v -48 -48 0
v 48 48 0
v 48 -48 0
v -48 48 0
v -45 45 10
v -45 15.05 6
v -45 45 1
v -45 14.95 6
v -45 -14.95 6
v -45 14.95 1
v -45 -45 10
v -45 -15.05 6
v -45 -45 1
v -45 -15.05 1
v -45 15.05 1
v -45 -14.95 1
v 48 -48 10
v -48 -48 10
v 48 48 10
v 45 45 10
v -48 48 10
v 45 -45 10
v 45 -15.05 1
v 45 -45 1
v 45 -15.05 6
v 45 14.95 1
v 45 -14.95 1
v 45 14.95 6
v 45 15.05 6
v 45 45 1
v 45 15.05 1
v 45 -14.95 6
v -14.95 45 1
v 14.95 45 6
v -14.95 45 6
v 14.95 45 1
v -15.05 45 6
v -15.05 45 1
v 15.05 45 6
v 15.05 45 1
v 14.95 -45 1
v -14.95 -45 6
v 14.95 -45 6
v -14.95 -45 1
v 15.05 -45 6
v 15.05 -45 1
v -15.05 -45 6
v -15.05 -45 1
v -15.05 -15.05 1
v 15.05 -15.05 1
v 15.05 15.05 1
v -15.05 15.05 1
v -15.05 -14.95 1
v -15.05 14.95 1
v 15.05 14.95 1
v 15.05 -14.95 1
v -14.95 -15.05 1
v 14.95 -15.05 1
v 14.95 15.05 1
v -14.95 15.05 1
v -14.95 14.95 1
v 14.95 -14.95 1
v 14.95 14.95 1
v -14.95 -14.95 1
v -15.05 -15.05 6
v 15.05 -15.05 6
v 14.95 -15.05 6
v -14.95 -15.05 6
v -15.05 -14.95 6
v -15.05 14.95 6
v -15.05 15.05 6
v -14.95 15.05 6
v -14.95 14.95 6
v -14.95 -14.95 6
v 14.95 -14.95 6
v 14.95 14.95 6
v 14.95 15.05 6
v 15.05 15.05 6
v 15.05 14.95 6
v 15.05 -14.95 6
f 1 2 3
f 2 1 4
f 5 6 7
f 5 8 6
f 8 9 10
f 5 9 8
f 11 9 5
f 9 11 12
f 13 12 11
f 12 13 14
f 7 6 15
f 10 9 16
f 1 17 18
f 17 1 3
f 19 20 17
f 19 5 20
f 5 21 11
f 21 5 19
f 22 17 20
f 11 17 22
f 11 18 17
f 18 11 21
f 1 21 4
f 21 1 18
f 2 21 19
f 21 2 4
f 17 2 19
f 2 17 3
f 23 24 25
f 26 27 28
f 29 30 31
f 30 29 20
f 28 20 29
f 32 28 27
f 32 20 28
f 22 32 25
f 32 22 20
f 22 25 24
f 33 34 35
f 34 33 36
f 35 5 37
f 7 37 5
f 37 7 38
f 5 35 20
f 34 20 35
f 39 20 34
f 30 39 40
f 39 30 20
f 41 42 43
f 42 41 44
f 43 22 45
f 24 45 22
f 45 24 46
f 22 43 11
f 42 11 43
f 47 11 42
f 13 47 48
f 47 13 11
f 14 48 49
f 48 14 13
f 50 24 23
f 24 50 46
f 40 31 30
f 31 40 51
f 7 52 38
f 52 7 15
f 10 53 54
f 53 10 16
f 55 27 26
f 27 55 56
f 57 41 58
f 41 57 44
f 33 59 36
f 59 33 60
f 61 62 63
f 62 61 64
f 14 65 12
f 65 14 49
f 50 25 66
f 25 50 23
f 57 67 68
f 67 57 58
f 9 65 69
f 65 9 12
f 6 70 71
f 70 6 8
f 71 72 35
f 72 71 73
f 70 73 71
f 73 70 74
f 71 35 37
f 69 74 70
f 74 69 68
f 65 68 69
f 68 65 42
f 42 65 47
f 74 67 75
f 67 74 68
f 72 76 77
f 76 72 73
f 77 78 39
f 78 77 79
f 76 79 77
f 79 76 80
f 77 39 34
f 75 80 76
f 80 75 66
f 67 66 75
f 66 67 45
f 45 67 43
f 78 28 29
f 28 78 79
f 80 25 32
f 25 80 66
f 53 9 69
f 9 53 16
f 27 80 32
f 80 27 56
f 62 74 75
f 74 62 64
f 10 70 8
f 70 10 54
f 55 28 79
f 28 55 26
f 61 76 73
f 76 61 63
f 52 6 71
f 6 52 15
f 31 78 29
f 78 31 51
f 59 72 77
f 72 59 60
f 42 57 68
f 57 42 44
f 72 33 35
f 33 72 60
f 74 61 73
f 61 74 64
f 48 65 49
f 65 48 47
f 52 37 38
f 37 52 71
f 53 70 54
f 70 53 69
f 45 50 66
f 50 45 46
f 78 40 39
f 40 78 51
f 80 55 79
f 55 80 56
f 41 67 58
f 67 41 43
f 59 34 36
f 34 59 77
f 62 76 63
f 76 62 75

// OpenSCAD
union()
{
    translate([0.0, 0.0, 0.5])
    {
        linear_extrude(height = 1.0, twist = 0.0, scale = 1.0, slices = 1, center = true)
        {
            scale([90.0, 90.0])
            {
                M8();
            }
        }
    }
    union()
    {
        translate([-46.5, 0.0, 5.0])
        {
            linear_extrude(height = 10.0, twist = 0.0, scale = 1.0, slices = 1, center = true)
            {
                scale([3.0, 96.0])
                {
                    M8();
                }
            }
        }
        translate([46.5, 0.0, 5.0])
        {
            linear_extrude(height = 10.0, twist = 0.0, scale = 1.0, slices = 1, center = true)
            {
                scale([3.0, 96.0])
                {
                    M8();
                }
            }
        }
        translate([0.0, 46.5, 5.0])
        {
            linear_extrude(height = 10.0, twist = 0.0, scale = 1.0, slices = 1, center = true)
            {
                scale([90.0, 3.0])
                {
                    M8();
                }
            }
        }
        translate([0.0, -46.5, 5.0])
        {
            linear_extrude(height = 10.0, twist = 0.0, scale = 1.0, slices = 1, center = true)
            {
                scale([90.0, 3.0])
                {
                    M8();
                }
            }
        }
    }
    union()
    {
        translate([0.0, -15.0, 3.5])
        {
            linear_extrude(height = 5.0, twist = 0.0, scale = 1.0, slices = 1, center = true)
            {
                scale([90.0, 0.1])
                {
                    M8();
                }
            }
        }
        translate([0.0, 15.0, 3.5])
        {
            linear_extrude(height = 5.0, twist = 0.0, scale = 1.0, slices = 1, center = true)
            {
                scale([90.0, 0.1])
                {
                    M8();
                }
            }
        }
        translate([-15.0, 0.0, 3.5])
        {
            linear_extrude(height = 5.0, twist = 0.0, scale = 1.0, slices = 1, center = true)
            {
                scale([0.1, 90.0])
                {
                    M8();
                }
            }
        }
        translate([15.0, 0.0, 3.5])
        {
            linear_extrude(height = 5.0, twist = 0.0, scale = 1.0, slices = 1, center = true)
            {
                scale([0.1, 90.0])
                {
                    M8();
                }
            }
        }
    }
}

module M8()
{
    polygon
    (
        points =
        [
            [-0.5, -0.5], 
            [0.5, -0.5], 
            [0.5, 0.5], 
            [-0.5, 0.5]
        ],
        paths =
        [
            [0, 1, 2, 3]
        ]
    );
}
